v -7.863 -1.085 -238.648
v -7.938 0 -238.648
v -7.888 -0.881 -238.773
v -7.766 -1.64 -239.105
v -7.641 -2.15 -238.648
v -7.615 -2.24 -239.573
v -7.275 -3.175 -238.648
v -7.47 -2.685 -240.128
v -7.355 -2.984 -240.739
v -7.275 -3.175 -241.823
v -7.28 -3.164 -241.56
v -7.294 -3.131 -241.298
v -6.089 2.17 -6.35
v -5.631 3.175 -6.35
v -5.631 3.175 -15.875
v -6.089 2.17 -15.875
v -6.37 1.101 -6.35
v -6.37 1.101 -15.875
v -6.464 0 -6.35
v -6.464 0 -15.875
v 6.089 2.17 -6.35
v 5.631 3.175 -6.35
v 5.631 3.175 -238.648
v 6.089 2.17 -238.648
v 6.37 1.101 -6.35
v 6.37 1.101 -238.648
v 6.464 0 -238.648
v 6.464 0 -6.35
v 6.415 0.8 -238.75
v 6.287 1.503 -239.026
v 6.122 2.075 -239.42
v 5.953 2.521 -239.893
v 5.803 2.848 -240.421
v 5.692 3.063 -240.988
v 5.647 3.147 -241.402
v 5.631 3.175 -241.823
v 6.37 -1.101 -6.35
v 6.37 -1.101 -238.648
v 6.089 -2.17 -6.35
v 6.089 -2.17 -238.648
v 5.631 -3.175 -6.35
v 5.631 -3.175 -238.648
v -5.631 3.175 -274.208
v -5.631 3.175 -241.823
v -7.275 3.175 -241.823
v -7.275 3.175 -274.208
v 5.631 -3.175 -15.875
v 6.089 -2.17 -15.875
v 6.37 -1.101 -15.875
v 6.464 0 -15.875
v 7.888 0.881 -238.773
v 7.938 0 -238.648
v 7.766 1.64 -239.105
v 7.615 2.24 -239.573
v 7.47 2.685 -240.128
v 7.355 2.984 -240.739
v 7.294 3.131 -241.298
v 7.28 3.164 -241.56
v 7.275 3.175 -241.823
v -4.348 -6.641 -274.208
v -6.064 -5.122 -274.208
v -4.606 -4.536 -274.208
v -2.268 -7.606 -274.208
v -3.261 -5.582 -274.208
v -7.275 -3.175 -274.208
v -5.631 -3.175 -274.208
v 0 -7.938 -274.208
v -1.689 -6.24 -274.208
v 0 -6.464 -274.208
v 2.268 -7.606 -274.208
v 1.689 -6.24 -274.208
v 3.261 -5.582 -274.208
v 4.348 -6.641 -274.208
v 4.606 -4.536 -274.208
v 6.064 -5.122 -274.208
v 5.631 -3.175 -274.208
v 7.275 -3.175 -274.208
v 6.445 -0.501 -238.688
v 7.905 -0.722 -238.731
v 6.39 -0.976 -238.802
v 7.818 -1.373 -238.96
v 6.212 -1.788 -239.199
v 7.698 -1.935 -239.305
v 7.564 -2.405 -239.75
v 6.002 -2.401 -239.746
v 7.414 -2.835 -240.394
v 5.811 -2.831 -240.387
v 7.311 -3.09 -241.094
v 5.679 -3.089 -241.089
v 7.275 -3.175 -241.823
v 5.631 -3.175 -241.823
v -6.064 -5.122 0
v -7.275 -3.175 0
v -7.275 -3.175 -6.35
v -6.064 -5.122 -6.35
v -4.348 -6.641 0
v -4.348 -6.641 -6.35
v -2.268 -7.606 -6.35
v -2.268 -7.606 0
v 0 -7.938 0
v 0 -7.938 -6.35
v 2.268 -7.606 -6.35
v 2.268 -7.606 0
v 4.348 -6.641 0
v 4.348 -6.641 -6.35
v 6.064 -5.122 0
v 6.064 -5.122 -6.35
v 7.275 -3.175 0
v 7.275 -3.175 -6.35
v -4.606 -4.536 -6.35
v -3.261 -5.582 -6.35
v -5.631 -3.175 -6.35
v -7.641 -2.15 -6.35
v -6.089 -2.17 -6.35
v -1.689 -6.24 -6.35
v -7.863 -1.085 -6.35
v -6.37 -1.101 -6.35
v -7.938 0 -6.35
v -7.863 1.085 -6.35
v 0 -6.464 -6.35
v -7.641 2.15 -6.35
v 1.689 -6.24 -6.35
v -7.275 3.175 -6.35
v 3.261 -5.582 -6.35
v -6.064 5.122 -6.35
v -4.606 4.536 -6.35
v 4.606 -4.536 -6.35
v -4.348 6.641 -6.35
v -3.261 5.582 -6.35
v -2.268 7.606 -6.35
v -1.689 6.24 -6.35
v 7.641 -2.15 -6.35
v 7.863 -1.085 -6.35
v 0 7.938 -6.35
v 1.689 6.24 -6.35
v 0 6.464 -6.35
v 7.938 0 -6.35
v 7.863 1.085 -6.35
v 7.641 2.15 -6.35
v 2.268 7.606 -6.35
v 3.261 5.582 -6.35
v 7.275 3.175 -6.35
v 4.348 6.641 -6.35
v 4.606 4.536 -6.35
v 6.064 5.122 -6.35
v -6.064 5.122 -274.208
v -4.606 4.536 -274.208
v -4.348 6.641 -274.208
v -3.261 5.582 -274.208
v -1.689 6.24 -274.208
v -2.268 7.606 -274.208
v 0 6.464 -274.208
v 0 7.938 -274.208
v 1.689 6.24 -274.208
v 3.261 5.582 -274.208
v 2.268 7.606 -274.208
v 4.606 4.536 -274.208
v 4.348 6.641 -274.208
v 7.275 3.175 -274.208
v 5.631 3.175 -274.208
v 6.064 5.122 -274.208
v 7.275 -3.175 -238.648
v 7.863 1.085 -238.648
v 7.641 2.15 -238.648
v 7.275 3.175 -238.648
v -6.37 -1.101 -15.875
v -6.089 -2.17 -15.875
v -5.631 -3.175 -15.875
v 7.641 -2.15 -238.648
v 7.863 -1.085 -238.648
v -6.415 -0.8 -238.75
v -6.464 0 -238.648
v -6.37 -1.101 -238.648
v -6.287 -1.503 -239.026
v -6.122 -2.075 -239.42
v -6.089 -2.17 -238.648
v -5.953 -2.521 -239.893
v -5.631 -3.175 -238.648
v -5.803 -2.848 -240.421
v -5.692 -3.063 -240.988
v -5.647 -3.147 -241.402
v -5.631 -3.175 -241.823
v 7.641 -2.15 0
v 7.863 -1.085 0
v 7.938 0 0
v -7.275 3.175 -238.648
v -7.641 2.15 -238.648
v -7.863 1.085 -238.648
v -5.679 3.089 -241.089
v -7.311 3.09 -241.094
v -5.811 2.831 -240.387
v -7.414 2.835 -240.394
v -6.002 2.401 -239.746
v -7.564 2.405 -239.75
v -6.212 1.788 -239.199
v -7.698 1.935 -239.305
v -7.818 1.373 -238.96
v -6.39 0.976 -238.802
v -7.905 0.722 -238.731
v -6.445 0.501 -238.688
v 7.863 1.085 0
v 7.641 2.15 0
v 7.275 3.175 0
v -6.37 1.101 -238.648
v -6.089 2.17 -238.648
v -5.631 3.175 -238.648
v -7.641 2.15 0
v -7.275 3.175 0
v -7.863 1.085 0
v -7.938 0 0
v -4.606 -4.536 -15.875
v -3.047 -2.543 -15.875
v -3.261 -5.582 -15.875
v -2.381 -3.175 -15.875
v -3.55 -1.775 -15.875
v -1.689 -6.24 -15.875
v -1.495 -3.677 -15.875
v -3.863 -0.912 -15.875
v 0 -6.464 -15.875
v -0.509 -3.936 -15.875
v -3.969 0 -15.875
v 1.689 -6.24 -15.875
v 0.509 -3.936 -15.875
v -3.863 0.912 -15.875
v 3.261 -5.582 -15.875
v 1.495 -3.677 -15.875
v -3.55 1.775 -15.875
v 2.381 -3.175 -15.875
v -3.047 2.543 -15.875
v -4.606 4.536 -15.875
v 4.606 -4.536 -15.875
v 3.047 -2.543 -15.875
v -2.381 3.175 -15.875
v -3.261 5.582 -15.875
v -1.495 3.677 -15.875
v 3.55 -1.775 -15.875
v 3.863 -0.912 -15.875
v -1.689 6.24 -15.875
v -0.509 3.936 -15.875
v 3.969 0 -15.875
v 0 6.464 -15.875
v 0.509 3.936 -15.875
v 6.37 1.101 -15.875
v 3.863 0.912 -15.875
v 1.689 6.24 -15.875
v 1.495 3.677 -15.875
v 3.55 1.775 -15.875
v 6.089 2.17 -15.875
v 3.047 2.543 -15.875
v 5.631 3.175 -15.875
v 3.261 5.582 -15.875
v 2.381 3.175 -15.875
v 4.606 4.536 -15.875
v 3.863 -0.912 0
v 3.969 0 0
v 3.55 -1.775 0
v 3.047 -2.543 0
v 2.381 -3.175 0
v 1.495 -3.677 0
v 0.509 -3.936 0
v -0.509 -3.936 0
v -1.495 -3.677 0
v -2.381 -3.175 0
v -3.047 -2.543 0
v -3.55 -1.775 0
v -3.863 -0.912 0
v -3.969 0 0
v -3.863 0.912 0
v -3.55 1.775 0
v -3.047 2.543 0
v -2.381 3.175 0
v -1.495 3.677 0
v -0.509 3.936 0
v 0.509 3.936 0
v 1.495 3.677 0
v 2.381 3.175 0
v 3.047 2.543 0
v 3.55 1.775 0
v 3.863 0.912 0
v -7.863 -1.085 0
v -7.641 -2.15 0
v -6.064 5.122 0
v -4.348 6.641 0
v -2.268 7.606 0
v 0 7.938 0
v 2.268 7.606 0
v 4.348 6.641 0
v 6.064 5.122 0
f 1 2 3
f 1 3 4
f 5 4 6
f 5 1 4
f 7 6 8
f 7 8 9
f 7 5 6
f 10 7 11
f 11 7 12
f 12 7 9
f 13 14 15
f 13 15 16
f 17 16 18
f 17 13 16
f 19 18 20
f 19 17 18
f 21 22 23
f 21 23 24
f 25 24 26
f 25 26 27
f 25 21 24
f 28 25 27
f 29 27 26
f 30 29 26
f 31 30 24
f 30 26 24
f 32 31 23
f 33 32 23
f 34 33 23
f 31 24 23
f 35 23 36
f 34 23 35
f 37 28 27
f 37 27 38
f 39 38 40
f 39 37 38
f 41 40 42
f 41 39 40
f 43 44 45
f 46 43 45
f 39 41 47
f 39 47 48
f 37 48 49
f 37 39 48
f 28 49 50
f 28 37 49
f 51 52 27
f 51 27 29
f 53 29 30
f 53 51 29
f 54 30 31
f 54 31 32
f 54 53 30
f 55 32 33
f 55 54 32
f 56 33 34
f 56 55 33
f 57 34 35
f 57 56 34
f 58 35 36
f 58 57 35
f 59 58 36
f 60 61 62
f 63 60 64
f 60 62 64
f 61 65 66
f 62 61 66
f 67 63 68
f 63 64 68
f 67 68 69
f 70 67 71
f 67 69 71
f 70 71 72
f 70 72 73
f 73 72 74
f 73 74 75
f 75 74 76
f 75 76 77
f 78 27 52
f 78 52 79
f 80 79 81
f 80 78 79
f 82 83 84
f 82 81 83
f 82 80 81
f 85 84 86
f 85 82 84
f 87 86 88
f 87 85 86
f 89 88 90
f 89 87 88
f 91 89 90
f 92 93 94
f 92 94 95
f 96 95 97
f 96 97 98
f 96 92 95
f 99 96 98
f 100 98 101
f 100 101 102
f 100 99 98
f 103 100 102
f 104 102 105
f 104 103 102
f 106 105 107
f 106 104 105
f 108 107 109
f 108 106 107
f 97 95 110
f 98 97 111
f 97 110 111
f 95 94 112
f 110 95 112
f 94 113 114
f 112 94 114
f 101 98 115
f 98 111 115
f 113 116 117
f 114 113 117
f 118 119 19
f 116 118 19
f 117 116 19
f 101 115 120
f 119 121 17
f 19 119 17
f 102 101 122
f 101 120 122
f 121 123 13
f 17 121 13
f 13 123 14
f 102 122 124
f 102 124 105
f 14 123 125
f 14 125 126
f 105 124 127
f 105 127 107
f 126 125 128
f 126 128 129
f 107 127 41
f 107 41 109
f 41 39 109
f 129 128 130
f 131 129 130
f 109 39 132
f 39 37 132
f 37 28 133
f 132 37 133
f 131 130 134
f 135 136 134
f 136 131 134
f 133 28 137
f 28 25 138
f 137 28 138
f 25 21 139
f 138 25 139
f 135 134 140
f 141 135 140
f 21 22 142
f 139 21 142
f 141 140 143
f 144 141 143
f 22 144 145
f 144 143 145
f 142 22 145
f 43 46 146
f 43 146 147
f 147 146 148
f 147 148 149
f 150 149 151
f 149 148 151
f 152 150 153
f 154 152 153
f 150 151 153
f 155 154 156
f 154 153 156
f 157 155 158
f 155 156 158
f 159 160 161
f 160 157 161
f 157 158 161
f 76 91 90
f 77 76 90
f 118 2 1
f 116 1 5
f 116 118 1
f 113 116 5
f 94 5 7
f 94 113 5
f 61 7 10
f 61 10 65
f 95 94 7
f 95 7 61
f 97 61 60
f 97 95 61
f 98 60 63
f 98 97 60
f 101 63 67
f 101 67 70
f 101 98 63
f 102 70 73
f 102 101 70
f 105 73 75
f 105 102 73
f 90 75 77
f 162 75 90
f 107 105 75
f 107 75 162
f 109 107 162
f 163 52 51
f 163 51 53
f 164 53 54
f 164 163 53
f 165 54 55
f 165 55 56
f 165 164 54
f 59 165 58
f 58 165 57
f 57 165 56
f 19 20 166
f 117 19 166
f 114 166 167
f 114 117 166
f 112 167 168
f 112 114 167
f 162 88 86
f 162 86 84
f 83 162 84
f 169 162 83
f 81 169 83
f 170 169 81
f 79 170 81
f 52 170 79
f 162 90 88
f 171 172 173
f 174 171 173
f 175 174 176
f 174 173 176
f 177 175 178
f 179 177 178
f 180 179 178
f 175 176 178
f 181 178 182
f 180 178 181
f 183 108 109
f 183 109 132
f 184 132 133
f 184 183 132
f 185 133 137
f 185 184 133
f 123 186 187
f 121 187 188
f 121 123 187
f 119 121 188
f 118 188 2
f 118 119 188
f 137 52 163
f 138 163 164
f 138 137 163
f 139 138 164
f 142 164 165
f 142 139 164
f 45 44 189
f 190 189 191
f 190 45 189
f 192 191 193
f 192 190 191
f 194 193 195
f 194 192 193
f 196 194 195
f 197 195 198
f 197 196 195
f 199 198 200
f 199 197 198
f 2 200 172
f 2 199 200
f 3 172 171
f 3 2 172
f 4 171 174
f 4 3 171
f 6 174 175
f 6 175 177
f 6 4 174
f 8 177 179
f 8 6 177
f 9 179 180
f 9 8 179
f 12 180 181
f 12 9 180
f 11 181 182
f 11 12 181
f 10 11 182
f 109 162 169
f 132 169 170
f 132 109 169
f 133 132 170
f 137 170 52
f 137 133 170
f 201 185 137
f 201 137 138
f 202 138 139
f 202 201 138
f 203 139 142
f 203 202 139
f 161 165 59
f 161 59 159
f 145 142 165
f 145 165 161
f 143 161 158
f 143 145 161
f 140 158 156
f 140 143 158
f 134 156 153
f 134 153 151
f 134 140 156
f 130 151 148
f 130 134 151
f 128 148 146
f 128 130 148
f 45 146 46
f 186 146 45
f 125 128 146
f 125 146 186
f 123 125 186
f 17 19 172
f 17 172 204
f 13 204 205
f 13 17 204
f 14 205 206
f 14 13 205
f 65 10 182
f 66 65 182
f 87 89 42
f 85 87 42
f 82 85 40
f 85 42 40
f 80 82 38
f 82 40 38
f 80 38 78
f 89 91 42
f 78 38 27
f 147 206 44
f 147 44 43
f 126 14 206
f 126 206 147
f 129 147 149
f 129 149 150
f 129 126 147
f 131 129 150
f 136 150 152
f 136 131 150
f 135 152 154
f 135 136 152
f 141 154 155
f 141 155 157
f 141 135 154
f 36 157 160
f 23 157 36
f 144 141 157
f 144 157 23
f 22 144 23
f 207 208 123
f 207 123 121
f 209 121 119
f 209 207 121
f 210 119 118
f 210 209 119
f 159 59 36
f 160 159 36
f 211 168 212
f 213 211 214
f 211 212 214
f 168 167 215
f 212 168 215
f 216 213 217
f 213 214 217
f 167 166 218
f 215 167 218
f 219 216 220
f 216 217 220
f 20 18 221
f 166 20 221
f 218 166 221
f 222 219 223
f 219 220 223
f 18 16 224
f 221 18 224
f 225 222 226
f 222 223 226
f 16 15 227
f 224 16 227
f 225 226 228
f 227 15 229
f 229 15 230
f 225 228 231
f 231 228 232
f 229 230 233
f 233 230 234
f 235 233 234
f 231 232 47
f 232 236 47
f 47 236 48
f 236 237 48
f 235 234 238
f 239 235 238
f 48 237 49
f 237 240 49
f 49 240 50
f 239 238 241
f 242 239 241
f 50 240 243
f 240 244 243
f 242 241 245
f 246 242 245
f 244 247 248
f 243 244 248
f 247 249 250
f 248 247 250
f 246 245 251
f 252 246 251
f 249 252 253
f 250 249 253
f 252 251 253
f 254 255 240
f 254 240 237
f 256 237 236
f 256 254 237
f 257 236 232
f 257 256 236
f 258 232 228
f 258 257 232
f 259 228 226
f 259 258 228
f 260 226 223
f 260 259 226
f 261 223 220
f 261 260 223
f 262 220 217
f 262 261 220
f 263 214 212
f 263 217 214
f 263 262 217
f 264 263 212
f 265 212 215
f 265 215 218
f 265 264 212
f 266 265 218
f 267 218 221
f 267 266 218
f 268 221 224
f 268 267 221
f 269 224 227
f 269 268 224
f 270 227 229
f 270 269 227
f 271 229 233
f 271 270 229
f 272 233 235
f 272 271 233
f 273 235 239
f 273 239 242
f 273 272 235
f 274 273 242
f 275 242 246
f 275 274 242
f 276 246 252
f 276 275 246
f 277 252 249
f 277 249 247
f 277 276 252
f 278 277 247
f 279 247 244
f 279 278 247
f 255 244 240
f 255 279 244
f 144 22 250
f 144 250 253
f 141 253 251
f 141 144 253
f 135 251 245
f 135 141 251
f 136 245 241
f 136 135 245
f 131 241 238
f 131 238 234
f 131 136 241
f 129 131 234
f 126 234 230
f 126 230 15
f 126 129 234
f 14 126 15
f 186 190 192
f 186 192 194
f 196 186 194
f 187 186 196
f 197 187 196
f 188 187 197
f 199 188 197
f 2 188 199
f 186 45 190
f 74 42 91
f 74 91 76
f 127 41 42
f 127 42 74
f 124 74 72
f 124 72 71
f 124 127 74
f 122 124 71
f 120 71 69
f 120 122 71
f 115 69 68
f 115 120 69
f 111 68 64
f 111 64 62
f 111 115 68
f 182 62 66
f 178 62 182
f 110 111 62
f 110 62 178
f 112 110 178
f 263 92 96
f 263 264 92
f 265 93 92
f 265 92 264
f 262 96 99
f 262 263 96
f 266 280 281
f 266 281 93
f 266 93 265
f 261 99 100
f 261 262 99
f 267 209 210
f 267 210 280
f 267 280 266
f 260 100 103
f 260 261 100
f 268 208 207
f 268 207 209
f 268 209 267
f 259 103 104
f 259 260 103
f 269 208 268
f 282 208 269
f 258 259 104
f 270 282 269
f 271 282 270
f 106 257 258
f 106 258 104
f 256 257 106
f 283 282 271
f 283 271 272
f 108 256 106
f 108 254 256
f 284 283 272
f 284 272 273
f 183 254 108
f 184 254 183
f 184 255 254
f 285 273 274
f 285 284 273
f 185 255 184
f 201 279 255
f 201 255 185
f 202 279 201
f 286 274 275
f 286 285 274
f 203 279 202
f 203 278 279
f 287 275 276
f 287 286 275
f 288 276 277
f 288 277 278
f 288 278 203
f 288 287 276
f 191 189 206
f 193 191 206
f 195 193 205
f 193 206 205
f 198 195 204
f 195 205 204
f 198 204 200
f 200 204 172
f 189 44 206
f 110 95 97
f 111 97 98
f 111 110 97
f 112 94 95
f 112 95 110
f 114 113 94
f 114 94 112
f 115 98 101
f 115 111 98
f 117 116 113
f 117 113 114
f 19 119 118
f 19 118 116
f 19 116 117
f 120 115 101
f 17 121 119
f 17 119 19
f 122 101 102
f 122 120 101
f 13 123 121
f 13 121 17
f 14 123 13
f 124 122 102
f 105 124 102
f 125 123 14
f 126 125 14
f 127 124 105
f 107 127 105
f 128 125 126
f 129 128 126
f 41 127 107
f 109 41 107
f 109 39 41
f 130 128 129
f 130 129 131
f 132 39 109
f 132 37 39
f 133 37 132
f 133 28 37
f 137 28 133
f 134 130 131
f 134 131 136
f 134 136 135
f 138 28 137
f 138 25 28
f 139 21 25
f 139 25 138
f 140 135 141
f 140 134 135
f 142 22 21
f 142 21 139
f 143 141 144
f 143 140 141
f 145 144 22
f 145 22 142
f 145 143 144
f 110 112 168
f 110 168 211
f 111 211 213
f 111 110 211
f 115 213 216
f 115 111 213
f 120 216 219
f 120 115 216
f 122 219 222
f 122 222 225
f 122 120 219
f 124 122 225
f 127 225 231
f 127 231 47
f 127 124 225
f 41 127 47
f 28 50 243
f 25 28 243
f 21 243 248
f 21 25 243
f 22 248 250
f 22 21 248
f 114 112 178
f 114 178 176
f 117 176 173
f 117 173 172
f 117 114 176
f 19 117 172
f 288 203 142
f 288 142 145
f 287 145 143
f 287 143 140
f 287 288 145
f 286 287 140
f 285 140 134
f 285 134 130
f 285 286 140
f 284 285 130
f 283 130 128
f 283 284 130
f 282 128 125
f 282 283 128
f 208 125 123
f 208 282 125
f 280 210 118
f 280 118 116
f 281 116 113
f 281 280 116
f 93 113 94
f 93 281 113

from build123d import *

# Parameters (mm, degrees)
THREADED_INSERT_1_1_DEPTH = 6.35
THREADED_START            = -6.35
THREADED_INSERT_1_2_DEPTH = 9.525
A_ARM_START               = -6.35
A_ARM_TUBE_DEPTH          = 267.858037
APEX_START                = -238.648037
APEX_SLOT_DEPTH           = 35.56
FILLET1_R                 = 3.175


with BuildPart() as part:
    # Sketch1 → Threaded insert 1-1 (new body)
    with BuildSketch(Plane.XY):
        with BuildLine():
            ThreePointArc((-2.38125, 3.175), (0, 3.96875), (2.38125, 3.175))
            Line((2.38125, 3.175), (5.630856905, 3.175))
            ThreePointArc((5.630856905, 3.175), (0, 6.4643), (-5.630856905, 3.175))
            Line((-5.630856905, 3.175), (-2.38125, 3.175))
        make_face()
        with BuildLine():
            ThreePointArc((-5.630856905, 3.175), (0, 6.4643), (5.630856905, 3.175))
            Line((5.630856905, 3.175), (7.274838916, 3.175))
            ThreePointArc((7.274838916, 3.175), (0, 7.9375), (-7.274838916, 3.175))
            Line((-7.274838916, 3.175), (-5.630856905, 3.175))
        make_face()
        with BuildLine():
            ThreePointArc((2.38125, 3.175), (3.549757914, 1.774878957), (3.96875, 0))
            Line((3.96875, 0), (6.4643, 0))
            ThreePointArc((6.4643, 0), (6.252468424, 1.641283978), (5.630856905, 3.175))
            Line((5.630856905, 3.175), (2.38125, 3.175))
        make_face()
        with BuildLine():
            Line((-6.4643, 0), (-3.96875, 0))
            ThreePointArc((-3.96875, 0), (-3.549757914, 1.774878957), (-2.38125, 3.175))
            Line((-2.38125, 3.175), (-5.630856905, 3.175))
            ThreePointArc((-5.630856905, 3.175), (-6.252468424, 1.641283978), (-6.4643, 0))
        make_face()
        with BuildLine():
            ThreePointArc((5.630856905, 3.175), (6.252468424, 1.641283978), (6.4643, 0))
            Line((6.4643, 0), (7.9375, 0))
            ThreePointArc((7.9375, 0), (7.770068859, 1.621707797), (7.274838916, 3.175))
            Line((7.274838916, 3.175), (5.630856905, 3.175))
        make_face()
        with BuildLine():
            Line((-7.9375, 0), (-6.4643, 0))
            ThreePointArc((-6.4643, 0), (-6.252468424, 1.641283978), (-5.630856905, 3.175))
            Line((-5.630856905, 3.175), (-7.274838916, 3.175))
            ThreePointArc((-7.274838916, 3.175), (-7.770068859, 1.621707797), (-7.9375, 0))
        make_face()
        with BuildLine():
            Line((7.9375, 0), (6.4643, 0))
            ThreePointArc((6.4643, 0), (6.252468424, -1.641283978), (5.630856905, -3.175))
            Line((5.630856905, -3.175), (7.274838916, -3.175))
            ThreePointArc((7.274838916, -3.175), (7.770068859, -1.621707797), (7.9375, 0))
        make_face()
        with BuildLine():
            ThreePointArc((-5.630856905, -3.175), (-6.252468424, -1.641283978), (-6.4643, 0))
            Line((-6.4643, 0), (-7.9375, 0))
            ThreePointArc((-7.9375, 0), (-7.770068859, -1.621707797), (-7.274838916, -3.175))
            Line((-7.274838916, -3.175), (-5.630856905, -3.175))
        make_face()
        with BuildLine():
            Line((6.4643, 0), (3.96875, 0))
            ThreePointArc((3.96875, 0), (3.549757914, -1.774878957), (2.38125, -3.175))
            Line((2.38125, -3.175), (5.630856905, -3.175))
            ThreePointArc((5.630856905, -3.175), (6.252468424, -1.641283978), (6.4643, 0))
        make_face()
        with BuildLine():
            ThreePointArc((-2.38125, -3.175), (-3.549757914, -1.774878957), (-3.96875, 0))
            Line((-3.96875, 0), (-6.4643, 0))
            ThreePointArc((-6.4643, 0), (-6.252468424, -1.641283978), (-5.630856905, -3.175))
            Line((-5.630856905, -3.175), (-2.38125, -3.175))
        make_face()
        with BuildLine():
            Line((5.630856905, -3.175), (2.38125, -3.175))
            ThreePointArc((2.38125, -3.175), (0, -3.96875), (-2.38125, -3.175))
            Line((-2.38125, -3.175), (-5.630856905, -3.175))
            ThreePointArc((-5.630856905, -3.175), (0, -6.4643), (5.630856905, -3.175))
        make_face()
        with BuildLine():
            Line((7.274838916, -3.175), (5.630856905, -3.175))
            ThreePointArc((5.630856905, -3.175), (0, -6.4643), (-5.630856905, -3.175))
            Line((-5.630856905, -3.175), (-7.274838916, -3.175))
            ThreePointArc((-7.274838916, -3.175), (0, -7.9375), (7.274838916, -3.175))
        make_face()
    extrude(amount=-THREADED_INSERT_1_1_DEPTH)

    # Sketch1<3> → Threaded insert 1-2 (add)
    with BuildSketch(Plane.XY.offset(THREADED_START)):
        with BuildLine():
            ThreePointArc((-2.38125, 3.175), (0, 3.96875), (2.38125, 3.175))
            Line((2.38125, 3.175), (5.630856905, 3.175))
            ThreePointArc((5.630856905, 3.175), (0, 6.4643), (-5.630856905, 3.175))
            Line((-5.630856905, 3.175), (-2.38125, 3.175))
        make_face()
        with BuildLine():
            ThreePointArc((2.38125, 3.175), (3.549757914, 1.774878957), (3.96875, 0))
            Line((3.96875, 0), (6.4643, 0))
            ThreePointArc((6.4643, 0), (6.252468424, 1.641283978), (5.630856905, 3.175))
            Line((5.630856905, 3.175), (2.38125, 3.175))
        make_face()
        with BuildLine():
            Line((-6.4643, 0), (-3.96875, 0))
            ThreePointArc((-3.96875, 0), (-3.549757914, 1.774878957), (-2.38125, 3.175))
            Line((-2.38125, 3.175), (-5.630856905, 3.175))
            ThreePointArc((-5.630856905, 3.175), (-6.252468424, 1.641283978), (-6.4643, 0))
        make_face()
        with BuildLine():
            Line((6.4643, 0), (3.96875, 0))
            ThreePointArc((3.96875, 0), (3.549757914, -1.774878957), (2.38125, -3.175))
            Line((2.38125, -3.175), (5.630856905, -3.175))
            ThreePointArc((5.630856905, -3.175), (6.252468424, -1.641283978), (6.4643, 0))
        make_face()
        with BuildLine():
            ThreePointArc((-2.38125, -3.175), (-3.549757914, -1.774878957), (-3.96875, 0))
            Line((-3.96875, 0), (-6.4643, 0))
            ThreePointArc((-6.4643, 0), (-6.252468424, -1.641283978), (-5.630856905, -3.175))
            Line((-5.630856905, -3.175), (-2.38125, -3.175))
        make_face()
        with BuildLine():
            Line((5.630856905, -3.175), (2.38125, -3.175))
            ThreePointArc((2.38125, -3.175), (0, -3.96875), (-2.38125, -3.175))
            Line((-2.38125, -3.175), (-5.630856905, -3.175))
            ThreePointArc((-5.630856905, -3.175), (0, -6.4643), (5.630856905, -3.175))
        make_face()
    extrude(amount=-THREADED_INSERT_1_2_DEPTH)


with BuildPart() as body_2:
    # Sketch1<4> → A-arm tube (new body)
    with BuildSketch(Plane.XY.offset(A_ARM_START)):
        with BuildLine():
            ThreePointArc((-5.630856905, 3.175), (0, 6.4643), (5.630856905, 3.175))
            Line((5.630856905, 3.175), (7.274838916, 3.175))
            ThreePointArc((7.274838916, 3.175), (0, 7.9375), (-7.274838916, 3.175))
            Line((-7.274838916, 3.175), (-5.630856905, 3.175))
        make_face()
        with BuildLine():
            ThreePointArc((5.630856905, 3.175), (6.252468424, 1.641283978), (6.4643, 0))
            Line((6.4643, 0), (7.9375, 0))
            ThreePointArc((7.9375, 0), (7.770068859, 1.621707797), (7.274838916, 3.175))
            Line((7.274838916, 3.175), (5.630856905, 3.175))
        make_face()
        with BuildLine():
            Line((-7.9375, 0), (-6.4643, 0))
            ThreePointArc((-6.4643, 0), (-6.252468424, 1.641283978), (-5.630856905, 3.175))
            Line((-5.630856905, 3.175), (-7.274838916, 3.175))
            ThreePointArc((-7.274838916, 3.175), (-7.770068859, 1.621707797), (-7.9375, 0))
        make_face()
        with BuildLine():
            Line((7.9375, 0), (6.4643, 0))
            ThreePointArc((6.4643, 0), (6.252468424, -1.641283978), (5.630856905, -3.175))
            Line((5.630856905, -3.175), (7.274838916, -3.175))
            ThreePointArc((7.274838916, -3.175), (7.770068859, -1.621707797), (7.9375, 0))
        make_face()
        with BuildLine():
            ThreePointArc((-5.630856905, -3.175), (-6.252468424, -1.641283978), (-6.4643, 0))
            Line((-6.4643, 0), (-7.9375, 0))
            ThreePointArc((-7.9375, 0), (-7.770068859, -1.621707797), (-7.274838916, -3.175))
            Line((-7.274838916, -3.175), (-5.630856905, -3.175))
        make_face()
        with BuildLine():
            Line((7.274838916, -3.175), (5.630856905, -3.175))
            ThreePointArc((5.630856905, -3.175), (0, -6.4643), (-5.630856905, -3.175))
            Line((-5.630856905, -3.175), (-7.274838916, -3.175))
            ThreePointArc((-7.274838916, -3.175), (0, -7.9375), (7.274838916, -3.175))
        make_face()
    extrude(amount=-A_ARM_TUBE_DEPTH)

    # Sketch1<5> → Apex slot (cut)
    with BuildSketch(Plane.XY.offset(APEX_START)):
        with BuildLine():
            ThreePointArc((5.630856905, 3.175), (6.252468424, 1.641283978), (6.4643, 0))
            Line((6.4643, 0), (7.9375, 0))
            ThreePointArc((7.9375, 0), (7.770068859, 1.621707797), (7.274838916, 3.175))
            Line((7.274838916, 3.175), (5.630856905, 3.175))
        make_face()
        with BuildLine():
            Line((-7.9375, 0), (-6.4643, 0))
            ThreePointArc((-6.4643, 0), (-6.252468424, 1.641283978), (-5.630856905, 3.175))
            Line((-5.630856905, 3.175), (-7.274838916, 3.175))
            ThreePointArc((-7.274838916, 3.175), (-7.770068859, 1.621707797), (-7.9375, 0))
        make_face()
        with BuildLine():
            Line((7.9375, 0), (6.4643, 0))
            ThreePointArc((6.4643, 0), (6.252468424, -1.641283978), (5.630856905, -3.175))
            Line((5.630856905, -3.175), (7.274838916, -3.175))
            ThreePointArc((7.274838916, -3.175), (7.770068859, -1.621707797), (7.9375, 0))
        make_face()
        with BuildLine():
            ThreePointArc((-5.630856905, -3.175), (-6.252468424, -1.641283978), (-6.4643, 0))
            Line((-6.4643, 0), (-7.9375, 0))
            ThreePointArc((-7.9375, 0), (-7.770068859, -1.621707797), (-7.274838916, -3.175))
            Line((-7.274838916, -3.175), (-5.630856905, -3.175))
        make_face()
    extrude(amount=-APEX_SLOT_DEPTH, mode=Mode.SUBTRACT)

    # Fillet1
    # the kernel refuses this fillet: 3.175 mm, written as the material it adds along each edge
    with BuildSketch(Plane(origin=(2.306643095, 3.175, -238.648037), x_dir=(0, 0, -1), z_dir=(-1, 0, 0))) as fillet1_piece_1_section:
        with BuildLine():
            CenterArc((FILLET1_R, FILLET1_R), FILLET1_R, 180, 90)
            Line((0, FILLET1_R), (0, 0))
            Line((0, 0), (FILLET1_R, 0))
        make_face()
    fillet1_piece_1 = extrude(amount=17.51898201, mode=Mode.PRIVATE)
    fillet1_piece_1 = fillet1_piece_1 - Plane(origin=(0, 0, -239.36776962), x_dir=(-0.8710698614669244, 0.49115913555994567, 0), z_dir=(0, 0, 1)) * Cylinder(6.4643, 48, mode=Mode.PRIVATE)
    fillet1_piece_1 = fillet1_piece_1 & Plane(origin=(0, 0, -239.36776962), x_dir=(-1, 0, 0), z_dir=(0, 0, 1)) * Cylinder(7.9375, 48, mode=Mode.PRIVATE)
    add(fillet1_piece_1)
    with BuildSketch(Plane(origin=(-15.212338916, -3.175, -238.648037), x_dir=(0, 0, -1), z_dir=(1, 0, 0))) as fillet1_piece_2_section:
        with BuildLine():
            CenterArc((FILLET1_R, FILLET1_R), FILLET1_R, 180, 90)
            Line((0, FILLET1_R), (0, 0))
            Line((0, 0), (FILLET1_R, 0))
        make_face()
    fillet1_piece_2 = extrude(amount=17.51898201, mode=Mode.PRIVATE)
    fillet1_piece_2 = fillet1_piece_2 - Plane(origin=(0, 0, -239.367769783), x_dir=(-0.8710698614669244, 0.49115913555994567, 0), z_dir=(0, 0, 1)) * Cylinder(6.4643, 48, mode=Mode.PRIVATE)
    fillet1_piece_2 = fillet1_piece_2 & Plane(origin=(0, 0, -239.367769783), x_dir=(-1, 0, 0), z_dir=(0, 0, 1)) * Cylinder(7.9375, 48, mode=Mode.PRIVATE)
    add(fillet1_piece_2)
    with BuildSketch(Plane(origin=(-2.306643095, -3.175, -238.648037), x_dir=(0, 0, -1), z_dir=(1, 0, 0))) as fillet1_piece_3_section:
        with BuildLine():
            CenterArc((FILLET1_R, FILLET1_R), FILLET1_R, 180, 90)
            Line((0, FILLET1_R), (0, 0))
            Line((0, 0), (FILLET1_R, 0))
        make_face()
    fillet1_piece_3 = extrude(amount=17.51898201, mode=Mode.PRIVATE)
    fillet1_piece_3 = fillet1_piece_3 - Plane(origin=(0, 0, -239.36776962), x_dir=(-0.8710698614669244, 0.49115913555994567, 0), z_dir=(0, 0, 1)) * Cylinder(6.4643, 48, mode=Mode.PRIVATE)
    fillet1_piece_3 = fillet1_piece_3 & Plane(origin=(0, 0, -239.36776962), x_dir=(-1, 0, 0), z_dir=(0, 0, 1)) * Cylinder(7.9375, 48, mode=Mode.PRIVATE)
    add(fillet1_piece_3)
    with BuildSketch(Plane(origin=(15.212338916, 3.175, -238.648037), x_dir=(0, -1, 0), z_dir=(-1, 0, 0))) as fillet1_piece_4_section:
        with BuildLine():
            CenterArc((FILLET1_R, -FILLET1_R), FILLET1_R, 90, 90)
            Line((0, -FILLET1_R), (0, 0))
            Line((0, 0), (FILLET1_R, 0))
        make_face()
    fillet1_piece_4 = extrude(amount=17.51898201, mode=Mode.PRIVATE)
    fillet1_piece_4 = fillet1_piece_4 - Plane(origin=(0, 0, -239.367769609), x_dir=(-0.8710698614669244, 0.49115913555994567, 0), z_dir=(0, 0, 1)) * Cylinder(6.4643, 48, mode=Mode.PRIVATE)
    fillet1_piece_4 = fillet1_piece_4 & Plane(origin=(0, 0, -239.367769609), x_dir=(-1, 0, 0), z_dir=(0, 0, 1)) * Cylinder(7.9375, 48, mode=Mode.PRIVATE)
    add(fillet1_piece_4)


solid = Compound([part.part, body_2.part])
